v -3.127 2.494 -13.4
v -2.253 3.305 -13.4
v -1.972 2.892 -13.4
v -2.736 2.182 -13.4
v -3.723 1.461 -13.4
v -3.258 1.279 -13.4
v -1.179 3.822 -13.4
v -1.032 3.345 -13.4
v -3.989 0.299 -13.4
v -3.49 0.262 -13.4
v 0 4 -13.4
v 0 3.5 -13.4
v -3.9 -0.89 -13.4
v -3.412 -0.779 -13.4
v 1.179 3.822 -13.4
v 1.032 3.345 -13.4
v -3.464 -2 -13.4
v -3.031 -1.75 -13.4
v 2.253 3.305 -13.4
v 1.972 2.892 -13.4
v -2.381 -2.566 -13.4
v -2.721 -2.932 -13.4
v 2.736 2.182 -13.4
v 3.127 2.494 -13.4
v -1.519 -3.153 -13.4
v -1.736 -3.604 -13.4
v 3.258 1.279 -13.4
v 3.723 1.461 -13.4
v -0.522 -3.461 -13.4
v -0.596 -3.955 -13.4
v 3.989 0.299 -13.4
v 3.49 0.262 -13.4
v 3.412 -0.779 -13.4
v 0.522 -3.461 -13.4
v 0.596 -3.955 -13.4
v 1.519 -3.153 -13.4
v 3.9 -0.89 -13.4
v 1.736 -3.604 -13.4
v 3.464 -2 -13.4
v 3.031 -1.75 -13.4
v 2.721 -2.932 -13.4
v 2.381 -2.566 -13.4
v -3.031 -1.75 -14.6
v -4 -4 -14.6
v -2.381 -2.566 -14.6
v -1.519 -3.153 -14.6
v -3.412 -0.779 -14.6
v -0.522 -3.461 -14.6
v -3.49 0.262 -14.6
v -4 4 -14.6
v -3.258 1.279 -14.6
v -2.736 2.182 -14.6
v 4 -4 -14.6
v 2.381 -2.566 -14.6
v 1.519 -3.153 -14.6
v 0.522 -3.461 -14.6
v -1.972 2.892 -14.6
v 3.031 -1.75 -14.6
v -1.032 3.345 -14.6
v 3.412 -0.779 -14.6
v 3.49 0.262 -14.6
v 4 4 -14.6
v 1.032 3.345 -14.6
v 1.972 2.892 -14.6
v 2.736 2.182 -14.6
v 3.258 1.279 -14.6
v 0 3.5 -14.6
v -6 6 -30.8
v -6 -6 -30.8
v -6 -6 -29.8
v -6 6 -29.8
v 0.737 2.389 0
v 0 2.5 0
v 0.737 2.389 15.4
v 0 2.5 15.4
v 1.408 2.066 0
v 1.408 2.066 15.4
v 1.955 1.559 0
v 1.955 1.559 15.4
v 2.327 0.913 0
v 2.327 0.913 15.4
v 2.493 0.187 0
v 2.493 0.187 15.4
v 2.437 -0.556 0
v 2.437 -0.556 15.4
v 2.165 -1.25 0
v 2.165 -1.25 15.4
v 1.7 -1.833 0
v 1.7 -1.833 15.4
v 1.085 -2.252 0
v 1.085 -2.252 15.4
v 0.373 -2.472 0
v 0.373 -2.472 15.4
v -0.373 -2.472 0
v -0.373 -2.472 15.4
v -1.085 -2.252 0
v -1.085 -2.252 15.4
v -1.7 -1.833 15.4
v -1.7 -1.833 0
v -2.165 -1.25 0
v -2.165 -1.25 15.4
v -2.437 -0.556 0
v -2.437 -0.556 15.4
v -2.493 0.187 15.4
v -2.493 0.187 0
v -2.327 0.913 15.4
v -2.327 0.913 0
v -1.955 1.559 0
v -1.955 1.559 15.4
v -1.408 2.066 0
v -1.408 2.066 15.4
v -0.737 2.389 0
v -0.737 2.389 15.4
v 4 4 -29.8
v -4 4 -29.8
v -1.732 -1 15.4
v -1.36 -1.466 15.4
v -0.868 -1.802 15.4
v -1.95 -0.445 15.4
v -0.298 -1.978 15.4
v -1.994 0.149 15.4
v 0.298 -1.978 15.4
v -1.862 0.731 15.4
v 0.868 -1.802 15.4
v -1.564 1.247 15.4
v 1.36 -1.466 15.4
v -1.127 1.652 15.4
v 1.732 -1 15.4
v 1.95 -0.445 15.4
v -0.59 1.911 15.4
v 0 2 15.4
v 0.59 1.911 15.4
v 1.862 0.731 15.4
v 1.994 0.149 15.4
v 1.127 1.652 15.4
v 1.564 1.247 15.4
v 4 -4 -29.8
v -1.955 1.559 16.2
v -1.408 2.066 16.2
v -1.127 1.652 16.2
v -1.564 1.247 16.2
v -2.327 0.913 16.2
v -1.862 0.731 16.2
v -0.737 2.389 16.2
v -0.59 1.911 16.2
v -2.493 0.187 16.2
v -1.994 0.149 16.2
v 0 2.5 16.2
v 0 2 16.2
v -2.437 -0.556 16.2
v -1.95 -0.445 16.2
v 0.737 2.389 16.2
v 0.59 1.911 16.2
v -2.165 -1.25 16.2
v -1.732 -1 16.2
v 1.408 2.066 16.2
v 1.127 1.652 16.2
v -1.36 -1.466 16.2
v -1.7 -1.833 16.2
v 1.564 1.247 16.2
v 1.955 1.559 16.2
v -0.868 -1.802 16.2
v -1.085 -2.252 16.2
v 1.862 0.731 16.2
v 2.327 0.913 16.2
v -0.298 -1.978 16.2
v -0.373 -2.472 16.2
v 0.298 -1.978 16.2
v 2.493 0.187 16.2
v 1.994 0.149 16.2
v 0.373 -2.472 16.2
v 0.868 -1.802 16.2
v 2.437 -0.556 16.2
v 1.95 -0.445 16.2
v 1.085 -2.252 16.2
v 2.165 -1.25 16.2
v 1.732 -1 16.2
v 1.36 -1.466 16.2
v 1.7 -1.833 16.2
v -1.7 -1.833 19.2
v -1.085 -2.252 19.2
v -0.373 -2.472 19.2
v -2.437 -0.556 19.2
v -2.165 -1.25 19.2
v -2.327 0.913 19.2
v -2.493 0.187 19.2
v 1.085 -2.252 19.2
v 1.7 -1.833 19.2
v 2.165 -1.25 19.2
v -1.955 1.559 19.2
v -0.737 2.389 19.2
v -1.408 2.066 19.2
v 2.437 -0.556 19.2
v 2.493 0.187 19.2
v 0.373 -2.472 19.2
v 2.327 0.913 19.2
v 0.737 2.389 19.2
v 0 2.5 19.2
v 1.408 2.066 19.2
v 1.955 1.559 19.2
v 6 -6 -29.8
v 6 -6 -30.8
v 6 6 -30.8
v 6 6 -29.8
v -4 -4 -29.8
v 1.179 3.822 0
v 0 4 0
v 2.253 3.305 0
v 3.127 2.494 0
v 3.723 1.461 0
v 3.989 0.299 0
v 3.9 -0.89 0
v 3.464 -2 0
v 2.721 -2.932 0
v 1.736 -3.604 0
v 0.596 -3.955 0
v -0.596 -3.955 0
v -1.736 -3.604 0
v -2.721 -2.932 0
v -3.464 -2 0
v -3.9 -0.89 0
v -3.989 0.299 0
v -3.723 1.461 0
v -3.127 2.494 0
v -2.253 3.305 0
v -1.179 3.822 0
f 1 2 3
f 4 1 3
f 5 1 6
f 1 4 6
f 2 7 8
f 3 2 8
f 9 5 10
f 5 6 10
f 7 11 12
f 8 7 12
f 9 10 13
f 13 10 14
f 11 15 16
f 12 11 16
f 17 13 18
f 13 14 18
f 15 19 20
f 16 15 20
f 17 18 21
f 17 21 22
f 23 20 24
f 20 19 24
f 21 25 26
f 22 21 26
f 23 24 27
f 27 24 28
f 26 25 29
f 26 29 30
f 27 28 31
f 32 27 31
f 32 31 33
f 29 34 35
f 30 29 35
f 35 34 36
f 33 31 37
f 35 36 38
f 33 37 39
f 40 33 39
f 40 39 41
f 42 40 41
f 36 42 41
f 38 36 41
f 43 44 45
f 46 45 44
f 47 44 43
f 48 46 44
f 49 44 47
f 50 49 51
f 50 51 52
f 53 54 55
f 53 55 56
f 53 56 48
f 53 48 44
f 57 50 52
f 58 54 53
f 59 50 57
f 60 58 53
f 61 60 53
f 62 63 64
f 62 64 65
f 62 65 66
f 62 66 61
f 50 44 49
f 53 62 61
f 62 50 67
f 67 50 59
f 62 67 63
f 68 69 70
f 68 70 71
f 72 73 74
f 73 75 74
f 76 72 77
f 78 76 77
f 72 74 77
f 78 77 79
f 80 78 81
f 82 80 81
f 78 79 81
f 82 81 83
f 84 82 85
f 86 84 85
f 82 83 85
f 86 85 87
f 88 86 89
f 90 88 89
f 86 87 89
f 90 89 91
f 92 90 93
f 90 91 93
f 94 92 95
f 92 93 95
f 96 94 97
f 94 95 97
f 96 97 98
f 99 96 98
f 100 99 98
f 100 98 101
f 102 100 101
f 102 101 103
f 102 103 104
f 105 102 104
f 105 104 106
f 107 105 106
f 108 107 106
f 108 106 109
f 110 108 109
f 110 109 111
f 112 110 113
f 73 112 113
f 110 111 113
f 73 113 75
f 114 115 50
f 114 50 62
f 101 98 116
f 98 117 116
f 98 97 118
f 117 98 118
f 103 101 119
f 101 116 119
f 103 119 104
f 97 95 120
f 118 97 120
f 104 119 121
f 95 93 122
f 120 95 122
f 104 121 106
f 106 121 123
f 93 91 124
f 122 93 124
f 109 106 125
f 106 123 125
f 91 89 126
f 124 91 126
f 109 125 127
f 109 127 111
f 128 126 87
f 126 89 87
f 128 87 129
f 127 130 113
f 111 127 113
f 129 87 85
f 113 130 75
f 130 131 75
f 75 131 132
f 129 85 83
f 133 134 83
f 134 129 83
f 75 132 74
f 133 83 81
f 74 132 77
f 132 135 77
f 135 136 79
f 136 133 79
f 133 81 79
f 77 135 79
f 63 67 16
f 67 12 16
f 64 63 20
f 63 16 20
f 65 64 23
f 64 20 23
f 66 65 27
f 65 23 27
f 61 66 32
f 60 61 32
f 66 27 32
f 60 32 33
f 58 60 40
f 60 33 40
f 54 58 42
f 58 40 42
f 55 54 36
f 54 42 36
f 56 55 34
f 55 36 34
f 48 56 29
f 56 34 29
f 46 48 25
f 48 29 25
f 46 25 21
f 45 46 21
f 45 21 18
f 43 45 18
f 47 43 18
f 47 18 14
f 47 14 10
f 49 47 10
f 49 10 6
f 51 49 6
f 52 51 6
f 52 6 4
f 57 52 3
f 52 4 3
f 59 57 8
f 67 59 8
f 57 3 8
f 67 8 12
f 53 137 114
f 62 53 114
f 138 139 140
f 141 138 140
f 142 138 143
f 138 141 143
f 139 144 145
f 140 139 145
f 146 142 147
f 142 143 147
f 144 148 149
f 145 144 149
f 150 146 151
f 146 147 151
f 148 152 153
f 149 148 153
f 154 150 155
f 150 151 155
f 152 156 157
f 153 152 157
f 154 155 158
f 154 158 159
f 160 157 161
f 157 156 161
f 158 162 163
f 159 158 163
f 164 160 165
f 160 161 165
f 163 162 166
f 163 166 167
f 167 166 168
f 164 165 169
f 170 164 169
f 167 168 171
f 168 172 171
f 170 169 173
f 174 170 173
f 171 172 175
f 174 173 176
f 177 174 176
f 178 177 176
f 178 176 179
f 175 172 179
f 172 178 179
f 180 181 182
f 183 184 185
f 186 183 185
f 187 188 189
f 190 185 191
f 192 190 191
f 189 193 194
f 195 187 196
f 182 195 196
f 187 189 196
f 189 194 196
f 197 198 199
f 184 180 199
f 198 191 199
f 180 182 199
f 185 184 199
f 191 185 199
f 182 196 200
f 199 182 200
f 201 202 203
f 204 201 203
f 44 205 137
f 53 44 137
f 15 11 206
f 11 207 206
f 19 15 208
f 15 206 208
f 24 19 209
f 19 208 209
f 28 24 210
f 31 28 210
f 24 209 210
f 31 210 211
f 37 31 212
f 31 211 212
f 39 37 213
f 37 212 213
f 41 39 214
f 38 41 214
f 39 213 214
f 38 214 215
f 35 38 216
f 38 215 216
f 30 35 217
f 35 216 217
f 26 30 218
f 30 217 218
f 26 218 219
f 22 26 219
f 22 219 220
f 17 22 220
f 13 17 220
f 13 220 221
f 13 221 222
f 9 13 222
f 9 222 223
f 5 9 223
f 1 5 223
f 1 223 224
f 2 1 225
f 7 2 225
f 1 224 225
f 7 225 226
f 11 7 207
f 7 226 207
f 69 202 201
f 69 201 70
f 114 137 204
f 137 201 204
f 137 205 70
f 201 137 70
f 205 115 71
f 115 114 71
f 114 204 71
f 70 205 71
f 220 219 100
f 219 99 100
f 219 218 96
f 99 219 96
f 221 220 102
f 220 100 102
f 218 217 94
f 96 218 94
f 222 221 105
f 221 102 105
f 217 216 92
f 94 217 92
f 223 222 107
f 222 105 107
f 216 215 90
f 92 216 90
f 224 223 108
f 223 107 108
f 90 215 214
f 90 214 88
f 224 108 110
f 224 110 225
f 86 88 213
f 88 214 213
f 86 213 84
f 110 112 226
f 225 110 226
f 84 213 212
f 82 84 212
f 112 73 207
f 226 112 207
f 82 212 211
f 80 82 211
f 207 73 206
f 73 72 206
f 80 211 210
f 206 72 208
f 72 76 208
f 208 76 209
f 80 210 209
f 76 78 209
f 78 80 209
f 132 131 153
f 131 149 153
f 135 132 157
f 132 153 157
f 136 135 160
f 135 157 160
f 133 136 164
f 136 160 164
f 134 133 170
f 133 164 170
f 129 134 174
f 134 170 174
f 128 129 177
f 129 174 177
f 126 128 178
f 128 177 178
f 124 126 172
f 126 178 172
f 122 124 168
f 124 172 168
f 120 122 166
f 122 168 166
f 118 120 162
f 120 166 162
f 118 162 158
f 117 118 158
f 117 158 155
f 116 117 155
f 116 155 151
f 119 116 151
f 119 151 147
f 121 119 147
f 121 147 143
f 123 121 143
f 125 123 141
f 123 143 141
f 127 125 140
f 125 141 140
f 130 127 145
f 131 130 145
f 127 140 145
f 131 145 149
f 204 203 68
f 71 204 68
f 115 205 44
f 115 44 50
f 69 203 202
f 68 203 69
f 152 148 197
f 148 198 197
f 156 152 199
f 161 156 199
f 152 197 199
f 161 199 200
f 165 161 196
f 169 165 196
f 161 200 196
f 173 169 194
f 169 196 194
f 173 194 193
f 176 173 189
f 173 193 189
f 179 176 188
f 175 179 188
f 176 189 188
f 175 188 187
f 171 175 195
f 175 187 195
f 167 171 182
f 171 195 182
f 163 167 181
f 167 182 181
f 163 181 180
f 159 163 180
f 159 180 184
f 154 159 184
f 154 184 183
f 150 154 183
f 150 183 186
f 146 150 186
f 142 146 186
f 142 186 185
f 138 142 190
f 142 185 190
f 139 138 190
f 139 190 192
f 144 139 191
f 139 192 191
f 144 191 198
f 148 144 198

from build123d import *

# Parameters (mm, degrees)
SKETCH3_W           = 8
SKETCH3_H           = 8
BOSS_EXTRUDE2_DEPTH = 15.2
SKETCH4_W           = 12
SKETCH4_H           = 12
BOSS_EXTRUDE3_DEPTH = 1


with BuildPart() as part:
    # Sketch1 → Revolve1 (revolve)
    with BuildSketch(Plane(origin=(0, 0, 0), x_dir=(0, 0, -1), z_dir=(1, 0, 0))):
        Polygon((-19.2, 0), (30.8, 0), (30.8, 5), (29.8, 5), (29.8, 4), (14.6, 4), (14.6, 3.5), (13.4, 3.5), (13.4, 4), (0, 4), (0, 2.5), (-15.4, 2.5), (-15.4, 2), (-16.2, 2), (-16.2, 2.5), (-19.2, 2.5), align=None)
    revolve(axis=Axis((0, 0, 19.2), (0, 0, -1)))

    # Sketch3 → Boss-Extrude2 (add)
    with BuildSketch(Plane.XY.offset(-29.8)):
        Rectangle(SKETCH3_W, SKETCH3_H)
    extrude(amount=BOSS_EXTRUDE2_DEPTH)

    # Sketch4 → Boss-Extrude3 (add)
    with BuildSketch(Plane(origin=(0, 0, -30.8), x_dir=(-1, 0, 0), z_dir=(0, 0, -1))):
        Rectangle(SKETCH4_W, SKETCH4_H)
    extrude(amount=-BOSS_EXTRUDE3_DEPTH)


solid = part.part
